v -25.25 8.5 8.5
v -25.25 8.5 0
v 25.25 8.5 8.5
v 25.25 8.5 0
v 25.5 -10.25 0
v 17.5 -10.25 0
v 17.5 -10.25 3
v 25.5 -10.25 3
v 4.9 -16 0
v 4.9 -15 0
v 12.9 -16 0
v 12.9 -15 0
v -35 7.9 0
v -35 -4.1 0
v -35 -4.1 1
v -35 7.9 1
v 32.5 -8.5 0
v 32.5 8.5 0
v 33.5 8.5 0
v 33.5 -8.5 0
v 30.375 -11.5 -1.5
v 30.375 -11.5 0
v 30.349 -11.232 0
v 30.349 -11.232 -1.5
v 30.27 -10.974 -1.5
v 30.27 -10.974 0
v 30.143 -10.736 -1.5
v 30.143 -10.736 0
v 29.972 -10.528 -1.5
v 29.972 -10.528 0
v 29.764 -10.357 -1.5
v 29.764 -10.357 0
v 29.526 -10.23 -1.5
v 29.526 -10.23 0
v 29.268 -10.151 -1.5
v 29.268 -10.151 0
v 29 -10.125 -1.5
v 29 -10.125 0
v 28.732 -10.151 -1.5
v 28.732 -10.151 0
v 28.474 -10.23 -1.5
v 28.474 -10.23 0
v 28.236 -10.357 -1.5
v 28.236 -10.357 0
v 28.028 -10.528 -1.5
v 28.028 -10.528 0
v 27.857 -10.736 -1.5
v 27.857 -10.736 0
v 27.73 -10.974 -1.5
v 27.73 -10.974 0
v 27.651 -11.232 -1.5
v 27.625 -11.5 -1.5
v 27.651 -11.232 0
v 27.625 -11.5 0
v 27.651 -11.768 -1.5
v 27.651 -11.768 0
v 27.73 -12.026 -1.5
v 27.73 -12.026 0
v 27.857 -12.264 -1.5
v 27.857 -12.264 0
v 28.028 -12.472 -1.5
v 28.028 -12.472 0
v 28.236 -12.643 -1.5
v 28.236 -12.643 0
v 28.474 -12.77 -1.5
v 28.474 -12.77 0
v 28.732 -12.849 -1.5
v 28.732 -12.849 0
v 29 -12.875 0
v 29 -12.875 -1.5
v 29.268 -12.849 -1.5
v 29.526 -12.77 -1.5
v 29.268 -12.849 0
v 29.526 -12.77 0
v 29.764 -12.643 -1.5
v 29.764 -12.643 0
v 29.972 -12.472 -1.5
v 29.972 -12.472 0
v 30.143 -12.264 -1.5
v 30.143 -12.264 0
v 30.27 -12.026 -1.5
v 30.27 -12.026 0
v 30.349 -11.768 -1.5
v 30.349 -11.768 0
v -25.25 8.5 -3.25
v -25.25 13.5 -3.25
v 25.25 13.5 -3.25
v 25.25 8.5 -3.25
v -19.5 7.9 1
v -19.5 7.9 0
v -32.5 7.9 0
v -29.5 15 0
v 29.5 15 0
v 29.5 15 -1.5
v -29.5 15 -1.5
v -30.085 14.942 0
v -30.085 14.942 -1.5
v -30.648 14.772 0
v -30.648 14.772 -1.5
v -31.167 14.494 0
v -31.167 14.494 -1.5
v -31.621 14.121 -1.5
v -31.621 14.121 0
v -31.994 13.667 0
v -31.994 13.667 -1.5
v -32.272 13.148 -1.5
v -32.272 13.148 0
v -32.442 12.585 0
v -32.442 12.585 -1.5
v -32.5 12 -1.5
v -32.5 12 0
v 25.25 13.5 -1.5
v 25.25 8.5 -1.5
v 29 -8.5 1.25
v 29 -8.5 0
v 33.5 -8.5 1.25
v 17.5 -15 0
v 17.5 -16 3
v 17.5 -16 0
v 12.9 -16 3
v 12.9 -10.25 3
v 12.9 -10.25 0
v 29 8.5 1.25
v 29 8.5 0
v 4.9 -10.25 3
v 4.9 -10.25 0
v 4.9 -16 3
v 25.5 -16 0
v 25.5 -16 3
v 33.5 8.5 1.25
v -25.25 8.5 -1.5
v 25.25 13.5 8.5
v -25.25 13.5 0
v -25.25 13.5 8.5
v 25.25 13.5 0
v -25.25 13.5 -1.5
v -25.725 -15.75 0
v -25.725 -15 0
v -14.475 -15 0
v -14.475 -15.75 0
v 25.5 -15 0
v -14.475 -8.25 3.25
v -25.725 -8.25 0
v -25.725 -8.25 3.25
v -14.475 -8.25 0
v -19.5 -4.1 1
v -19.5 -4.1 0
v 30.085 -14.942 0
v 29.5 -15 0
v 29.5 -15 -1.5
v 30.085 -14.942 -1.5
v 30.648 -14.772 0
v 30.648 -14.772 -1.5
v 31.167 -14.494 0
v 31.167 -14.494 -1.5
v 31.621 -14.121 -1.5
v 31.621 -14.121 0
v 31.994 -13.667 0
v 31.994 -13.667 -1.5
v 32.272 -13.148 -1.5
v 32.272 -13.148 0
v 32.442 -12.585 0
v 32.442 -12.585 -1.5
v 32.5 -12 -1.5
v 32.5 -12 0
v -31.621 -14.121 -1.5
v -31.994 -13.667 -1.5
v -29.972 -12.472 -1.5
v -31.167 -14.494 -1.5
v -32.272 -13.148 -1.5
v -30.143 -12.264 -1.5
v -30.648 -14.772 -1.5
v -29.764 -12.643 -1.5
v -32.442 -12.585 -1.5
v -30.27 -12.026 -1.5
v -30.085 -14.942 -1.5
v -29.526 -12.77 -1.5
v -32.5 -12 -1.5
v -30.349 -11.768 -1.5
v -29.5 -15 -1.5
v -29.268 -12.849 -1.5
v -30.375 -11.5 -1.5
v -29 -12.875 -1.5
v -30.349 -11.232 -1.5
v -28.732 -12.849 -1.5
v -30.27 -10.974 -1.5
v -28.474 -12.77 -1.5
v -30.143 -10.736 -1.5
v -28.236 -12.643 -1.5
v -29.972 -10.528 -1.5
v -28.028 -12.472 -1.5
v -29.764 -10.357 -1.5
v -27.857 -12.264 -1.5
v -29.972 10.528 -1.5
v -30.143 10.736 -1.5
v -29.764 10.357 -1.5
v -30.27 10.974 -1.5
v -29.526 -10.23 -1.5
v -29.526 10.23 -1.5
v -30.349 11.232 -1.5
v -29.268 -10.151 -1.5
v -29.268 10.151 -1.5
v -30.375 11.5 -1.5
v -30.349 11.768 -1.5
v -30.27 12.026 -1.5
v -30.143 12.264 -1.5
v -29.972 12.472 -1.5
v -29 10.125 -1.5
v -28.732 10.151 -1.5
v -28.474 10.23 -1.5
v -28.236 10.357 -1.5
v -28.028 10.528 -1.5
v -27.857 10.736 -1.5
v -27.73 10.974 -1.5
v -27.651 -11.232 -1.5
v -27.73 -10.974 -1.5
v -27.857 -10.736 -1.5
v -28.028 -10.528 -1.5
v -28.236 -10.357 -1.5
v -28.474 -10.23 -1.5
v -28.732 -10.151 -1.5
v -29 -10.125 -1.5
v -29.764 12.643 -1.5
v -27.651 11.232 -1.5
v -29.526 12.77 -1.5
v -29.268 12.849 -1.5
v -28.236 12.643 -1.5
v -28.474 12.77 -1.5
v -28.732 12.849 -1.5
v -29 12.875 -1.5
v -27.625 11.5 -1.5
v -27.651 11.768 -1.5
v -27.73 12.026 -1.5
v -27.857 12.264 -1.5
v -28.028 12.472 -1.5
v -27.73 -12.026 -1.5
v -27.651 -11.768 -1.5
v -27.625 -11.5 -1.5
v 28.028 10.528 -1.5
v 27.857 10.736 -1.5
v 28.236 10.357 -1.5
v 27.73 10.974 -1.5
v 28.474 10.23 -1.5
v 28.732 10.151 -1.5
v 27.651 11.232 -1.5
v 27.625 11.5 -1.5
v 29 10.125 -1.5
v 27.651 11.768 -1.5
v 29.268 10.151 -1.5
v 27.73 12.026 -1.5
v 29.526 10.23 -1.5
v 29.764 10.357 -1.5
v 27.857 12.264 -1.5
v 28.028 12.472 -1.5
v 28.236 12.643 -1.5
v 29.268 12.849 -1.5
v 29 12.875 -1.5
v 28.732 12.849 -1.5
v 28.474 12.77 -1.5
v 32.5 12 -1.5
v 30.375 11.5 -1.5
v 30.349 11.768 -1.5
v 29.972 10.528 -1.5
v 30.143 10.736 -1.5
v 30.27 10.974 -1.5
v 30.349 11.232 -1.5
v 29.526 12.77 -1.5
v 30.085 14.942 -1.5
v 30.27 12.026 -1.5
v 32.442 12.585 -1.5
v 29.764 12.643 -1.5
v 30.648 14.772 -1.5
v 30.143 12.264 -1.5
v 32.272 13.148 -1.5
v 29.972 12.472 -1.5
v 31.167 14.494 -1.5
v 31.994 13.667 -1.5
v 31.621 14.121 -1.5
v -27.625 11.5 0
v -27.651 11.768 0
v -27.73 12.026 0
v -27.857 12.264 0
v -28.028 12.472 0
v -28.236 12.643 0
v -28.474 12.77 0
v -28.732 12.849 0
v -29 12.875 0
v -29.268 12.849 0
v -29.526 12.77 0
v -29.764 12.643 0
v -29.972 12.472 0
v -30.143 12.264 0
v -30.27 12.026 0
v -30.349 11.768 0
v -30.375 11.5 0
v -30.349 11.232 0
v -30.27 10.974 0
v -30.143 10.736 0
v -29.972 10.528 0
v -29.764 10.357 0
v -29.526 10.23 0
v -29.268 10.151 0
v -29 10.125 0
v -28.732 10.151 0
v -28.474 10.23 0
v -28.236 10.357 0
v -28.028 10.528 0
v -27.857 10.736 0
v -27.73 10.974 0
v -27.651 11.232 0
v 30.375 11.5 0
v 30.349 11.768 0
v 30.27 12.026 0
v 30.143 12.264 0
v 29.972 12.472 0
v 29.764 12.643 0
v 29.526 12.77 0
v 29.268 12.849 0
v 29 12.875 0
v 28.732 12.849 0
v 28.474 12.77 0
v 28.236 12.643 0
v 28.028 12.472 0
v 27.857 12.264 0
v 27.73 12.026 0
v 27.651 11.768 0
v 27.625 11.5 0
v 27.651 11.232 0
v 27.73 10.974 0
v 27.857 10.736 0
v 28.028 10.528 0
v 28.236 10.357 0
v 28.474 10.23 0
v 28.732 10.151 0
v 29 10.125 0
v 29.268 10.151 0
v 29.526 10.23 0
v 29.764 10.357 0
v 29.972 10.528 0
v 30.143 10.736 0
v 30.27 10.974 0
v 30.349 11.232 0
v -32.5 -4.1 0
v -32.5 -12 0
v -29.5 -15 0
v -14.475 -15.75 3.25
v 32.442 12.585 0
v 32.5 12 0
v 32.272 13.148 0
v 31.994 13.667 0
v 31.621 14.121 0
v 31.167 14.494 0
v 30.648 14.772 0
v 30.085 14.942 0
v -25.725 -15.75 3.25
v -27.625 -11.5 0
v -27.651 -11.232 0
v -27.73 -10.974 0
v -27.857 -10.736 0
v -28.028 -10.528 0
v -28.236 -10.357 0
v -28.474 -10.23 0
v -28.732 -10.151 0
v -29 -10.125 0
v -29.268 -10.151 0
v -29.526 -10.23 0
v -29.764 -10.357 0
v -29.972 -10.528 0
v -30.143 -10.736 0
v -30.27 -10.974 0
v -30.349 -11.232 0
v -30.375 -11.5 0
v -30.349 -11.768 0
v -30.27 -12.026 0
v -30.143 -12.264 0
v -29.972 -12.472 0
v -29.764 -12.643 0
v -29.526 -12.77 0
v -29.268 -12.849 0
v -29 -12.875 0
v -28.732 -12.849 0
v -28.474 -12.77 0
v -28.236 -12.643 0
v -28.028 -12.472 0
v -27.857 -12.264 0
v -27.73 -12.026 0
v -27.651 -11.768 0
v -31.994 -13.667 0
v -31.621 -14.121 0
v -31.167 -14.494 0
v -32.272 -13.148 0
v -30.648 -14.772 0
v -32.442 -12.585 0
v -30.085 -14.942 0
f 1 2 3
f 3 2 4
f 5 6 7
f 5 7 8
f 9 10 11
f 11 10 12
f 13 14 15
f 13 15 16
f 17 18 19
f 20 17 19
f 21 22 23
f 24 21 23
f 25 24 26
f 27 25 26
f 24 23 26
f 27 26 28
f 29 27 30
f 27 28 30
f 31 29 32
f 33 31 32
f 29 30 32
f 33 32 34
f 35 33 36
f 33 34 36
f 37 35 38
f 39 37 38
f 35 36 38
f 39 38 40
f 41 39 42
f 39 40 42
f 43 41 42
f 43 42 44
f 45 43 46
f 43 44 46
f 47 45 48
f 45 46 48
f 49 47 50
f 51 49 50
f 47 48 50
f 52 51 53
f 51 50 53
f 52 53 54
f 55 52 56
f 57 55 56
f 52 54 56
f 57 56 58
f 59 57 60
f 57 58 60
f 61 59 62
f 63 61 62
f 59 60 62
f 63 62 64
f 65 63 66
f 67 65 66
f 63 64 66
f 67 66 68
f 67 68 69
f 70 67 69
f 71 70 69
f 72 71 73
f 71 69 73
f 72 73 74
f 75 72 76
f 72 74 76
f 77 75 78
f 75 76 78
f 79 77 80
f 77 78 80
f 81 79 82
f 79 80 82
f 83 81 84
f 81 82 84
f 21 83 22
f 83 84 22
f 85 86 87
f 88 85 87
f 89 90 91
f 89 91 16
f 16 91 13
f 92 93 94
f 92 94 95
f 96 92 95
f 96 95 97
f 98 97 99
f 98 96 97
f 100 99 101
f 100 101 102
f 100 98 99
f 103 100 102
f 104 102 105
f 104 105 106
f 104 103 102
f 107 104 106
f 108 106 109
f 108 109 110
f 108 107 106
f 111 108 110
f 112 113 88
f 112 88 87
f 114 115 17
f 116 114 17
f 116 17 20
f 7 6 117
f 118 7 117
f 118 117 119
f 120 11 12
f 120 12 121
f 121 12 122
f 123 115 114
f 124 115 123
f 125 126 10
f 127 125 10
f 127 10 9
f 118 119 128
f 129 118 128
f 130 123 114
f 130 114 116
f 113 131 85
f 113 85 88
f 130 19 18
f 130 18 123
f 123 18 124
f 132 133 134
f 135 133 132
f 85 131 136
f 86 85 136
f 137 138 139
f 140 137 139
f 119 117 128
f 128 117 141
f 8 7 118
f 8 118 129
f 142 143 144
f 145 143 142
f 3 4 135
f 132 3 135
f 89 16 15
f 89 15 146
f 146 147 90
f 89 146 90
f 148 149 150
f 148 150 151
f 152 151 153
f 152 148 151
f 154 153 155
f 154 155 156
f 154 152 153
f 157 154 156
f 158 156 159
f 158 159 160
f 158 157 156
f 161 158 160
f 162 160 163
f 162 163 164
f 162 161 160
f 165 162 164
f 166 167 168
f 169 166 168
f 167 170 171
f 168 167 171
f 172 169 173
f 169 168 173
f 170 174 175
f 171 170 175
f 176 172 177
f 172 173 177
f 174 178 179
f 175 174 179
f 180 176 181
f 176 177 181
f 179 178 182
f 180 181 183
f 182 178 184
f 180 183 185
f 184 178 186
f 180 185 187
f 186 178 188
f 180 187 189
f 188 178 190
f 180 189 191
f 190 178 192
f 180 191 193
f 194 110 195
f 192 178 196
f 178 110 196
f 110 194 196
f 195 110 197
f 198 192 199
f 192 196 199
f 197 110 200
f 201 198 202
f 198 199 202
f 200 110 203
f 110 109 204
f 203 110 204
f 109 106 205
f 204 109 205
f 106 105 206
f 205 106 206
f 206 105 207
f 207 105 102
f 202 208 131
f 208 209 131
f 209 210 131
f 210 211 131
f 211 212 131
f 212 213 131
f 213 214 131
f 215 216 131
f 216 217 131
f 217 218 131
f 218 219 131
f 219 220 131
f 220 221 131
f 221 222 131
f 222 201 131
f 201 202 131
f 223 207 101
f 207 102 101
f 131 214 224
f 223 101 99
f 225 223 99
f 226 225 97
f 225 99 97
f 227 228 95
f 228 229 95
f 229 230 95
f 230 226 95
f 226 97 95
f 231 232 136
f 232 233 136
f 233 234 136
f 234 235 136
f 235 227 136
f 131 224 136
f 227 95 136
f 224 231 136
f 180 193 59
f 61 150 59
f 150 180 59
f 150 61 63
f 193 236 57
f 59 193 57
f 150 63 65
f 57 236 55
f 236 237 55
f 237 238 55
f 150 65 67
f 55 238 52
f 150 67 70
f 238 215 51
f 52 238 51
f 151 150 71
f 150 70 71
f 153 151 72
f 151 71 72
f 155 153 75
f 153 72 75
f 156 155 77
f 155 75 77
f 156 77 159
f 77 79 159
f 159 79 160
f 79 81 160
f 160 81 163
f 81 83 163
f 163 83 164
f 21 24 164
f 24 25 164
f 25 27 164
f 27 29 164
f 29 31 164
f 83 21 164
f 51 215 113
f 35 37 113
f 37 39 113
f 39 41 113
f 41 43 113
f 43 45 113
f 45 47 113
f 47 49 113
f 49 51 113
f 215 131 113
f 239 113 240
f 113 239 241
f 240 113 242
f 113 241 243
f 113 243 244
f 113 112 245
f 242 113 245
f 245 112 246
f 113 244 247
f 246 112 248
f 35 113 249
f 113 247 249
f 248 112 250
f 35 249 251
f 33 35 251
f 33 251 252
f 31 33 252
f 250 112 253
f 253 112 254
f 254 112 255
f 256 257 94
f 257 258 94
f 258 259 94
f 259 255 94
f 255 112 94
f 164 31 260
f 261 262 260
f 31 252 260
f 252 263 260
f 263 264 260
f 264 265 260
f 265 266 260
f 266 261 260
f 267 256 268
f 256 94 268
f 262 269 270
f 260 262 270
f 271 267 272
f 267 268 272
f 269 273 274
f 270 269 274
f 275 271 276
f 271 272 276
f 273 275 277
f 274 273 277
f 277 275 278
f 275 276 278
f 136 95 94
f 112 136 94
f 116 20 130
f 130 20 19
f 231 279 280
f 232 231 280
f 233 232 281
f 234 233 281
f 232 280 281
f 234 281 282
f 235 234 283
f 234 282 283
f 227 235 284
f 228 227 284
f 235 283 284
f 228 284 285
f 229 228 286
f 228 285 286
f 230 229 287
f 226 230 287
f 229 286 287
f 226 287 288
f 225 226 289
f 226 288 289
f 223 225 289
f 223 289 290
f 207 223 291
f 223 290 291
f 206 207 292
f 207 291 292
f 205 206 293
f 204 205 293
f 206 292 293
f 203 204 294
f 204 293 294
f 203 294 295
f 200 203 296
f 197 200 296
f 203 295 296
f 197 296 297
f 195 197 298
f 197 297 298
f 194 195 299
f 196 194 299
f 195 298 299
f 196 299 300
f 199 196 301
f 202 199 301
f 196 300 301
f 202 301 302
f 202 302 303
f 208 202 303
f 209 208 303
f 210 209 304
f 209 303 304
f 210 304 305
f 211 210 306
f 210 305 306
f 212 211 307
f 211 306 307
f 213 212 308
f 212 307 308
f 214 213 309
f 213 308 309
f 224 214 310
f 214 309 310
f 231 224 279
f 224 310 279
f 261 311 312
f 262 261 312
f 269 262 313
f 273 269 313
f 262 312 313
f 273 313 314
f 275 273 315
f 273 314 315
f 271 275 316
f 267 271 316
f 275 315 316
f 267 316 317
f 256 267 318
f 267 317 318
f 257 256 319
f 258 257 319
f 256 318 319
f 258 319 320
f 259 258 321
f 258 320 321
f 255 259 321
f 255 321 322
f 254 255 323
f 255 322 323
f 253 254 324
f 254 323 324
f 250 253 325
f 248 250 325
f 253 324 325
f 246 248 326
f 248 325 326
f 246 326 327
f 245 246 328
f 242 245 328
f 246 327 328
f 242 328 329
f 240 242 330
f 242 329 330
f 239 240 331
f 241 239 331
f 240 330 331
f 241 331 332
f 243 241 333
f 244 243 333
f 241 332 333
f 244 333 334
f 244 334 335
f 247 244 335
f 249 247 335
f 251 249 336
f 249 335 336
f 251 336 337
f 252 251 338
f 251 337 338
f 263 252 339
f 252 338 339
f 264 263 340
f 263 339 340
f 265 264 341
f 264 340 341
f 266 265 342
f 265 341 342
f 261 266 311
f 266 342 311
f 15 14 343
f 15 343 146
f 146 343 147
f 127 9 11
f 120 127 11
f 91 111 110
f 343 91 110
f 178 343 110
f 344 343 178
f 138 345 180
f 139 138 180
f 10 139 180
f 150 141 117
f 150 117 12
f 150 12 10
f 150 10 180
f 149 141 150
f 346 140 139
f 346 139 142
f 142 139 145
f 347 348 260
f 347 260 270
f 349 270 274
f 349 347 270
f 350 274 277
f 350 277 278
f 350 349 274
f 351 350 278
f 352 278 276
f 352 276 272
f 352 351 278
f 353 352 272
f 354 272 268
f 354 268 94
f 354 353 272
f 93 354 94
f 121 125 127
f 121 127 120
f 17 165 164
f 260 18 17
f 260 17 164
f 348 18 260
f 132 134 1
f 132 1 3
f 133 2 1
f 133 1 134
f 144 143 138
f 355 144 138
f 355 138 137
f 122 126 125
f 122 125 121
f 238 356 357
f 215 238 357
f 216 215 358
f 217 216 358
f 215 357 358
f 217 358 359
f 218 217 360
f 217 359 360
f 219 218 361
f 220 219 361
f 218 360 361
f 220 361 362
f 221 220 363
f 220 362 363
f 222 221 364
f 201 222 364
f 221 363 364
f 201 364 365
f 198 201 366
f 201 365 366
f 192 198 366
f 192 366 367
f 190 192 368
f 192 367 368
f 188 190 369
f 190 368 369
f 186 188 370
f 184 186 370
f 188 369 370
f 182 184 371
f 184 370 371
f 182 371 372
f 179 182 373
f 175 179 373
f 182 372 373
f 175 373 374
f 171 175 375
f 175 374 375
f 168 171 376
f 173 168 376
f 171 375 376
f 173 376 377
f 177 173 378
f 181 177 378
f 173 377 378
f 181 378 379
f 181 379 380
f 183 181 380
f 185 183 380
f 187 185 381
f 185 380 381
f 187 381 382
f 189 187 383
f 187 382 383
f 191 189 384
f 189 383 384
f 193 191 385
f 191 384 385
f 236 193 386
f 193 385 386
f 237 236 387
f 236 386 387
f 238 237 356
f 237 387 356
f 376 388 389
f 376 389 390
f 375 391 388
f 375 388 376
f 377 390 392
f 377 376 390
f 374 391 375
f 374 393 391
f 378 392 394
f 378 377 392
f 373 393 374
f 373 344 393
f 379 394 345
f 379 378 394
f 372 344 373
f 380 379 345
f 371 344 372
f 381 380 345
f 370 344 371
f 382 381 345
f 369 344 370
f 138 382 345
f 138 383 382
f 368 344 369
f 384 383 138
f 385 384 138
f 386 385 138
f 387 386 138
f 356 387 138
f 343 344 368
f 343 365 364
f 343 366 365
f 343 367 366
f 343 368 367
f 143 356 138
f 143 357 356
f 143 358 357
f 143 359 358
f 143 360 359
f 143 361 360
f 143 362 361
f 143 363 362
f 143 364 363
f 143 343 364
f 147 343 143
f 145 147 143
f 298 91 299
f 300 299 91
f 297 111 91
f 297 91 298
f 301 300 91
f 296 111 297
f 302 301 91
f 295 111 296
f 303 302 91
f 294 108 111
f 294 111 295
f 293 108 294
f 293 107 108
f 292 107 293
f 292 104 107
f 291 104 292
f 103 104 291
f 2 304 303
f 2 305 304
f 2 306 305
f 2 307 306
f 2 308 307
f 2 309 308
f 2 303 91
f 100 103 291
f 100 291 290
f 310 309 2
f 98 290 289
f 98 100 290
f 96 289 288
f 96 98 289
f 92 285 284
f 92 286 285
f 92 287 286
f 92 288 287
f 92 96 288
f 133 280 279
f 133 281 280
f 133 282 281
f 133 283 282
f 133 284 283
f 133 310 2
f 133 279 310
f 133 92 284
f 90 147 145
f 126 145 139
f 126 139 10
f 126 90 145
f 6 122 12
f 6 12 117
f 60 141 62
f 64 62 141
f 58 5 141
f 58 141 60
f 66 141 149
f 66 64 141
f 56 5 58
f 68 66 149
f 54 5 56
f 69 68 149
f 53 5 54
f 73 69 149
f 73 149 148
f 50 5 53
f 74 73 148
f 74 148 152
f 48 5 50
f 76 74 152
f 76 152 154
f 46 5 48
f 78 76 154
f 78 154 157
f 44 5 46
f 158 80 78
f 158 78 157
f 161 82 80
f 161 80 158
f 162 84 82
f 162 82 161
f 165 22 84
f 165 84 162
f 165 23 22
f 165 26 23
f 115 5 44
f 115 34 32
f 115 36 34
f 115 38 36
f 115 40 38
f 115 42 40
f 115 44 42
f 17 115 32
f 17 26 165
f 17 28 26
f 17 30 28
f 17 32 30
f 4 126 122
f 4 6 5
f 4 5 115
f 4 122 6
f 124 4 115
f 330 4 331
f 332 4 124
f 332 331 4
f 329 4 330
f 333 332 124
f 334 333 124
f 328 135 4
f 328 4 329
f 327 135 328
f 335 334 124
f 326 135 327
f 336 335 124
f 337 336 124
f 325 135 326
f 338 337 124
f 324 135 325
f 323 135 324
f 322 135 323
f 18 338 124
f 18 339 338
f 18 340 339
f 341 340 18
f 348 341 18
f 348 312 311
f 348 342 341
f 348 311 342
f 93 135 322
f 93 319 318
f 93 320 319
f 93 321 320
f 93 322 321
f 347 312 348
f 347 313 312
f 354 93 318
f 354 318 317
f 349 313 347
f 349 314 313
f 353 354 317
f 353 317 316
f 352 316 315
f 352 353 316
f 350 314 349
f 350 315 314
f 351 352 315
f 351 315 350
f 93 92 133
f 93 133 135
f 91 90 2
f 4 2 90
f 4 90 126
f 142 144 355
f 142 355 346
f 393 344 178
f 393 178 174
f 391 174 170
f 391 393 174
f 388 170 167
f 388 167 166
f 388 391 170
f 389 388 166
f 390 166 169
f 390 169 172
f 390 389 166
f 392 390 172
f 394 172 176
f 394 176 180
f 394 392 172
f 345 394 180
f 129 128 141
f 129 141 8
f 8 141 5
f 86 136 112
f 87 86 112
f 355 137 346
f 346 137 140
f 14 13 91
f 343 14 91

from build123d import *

# Parameters (mm, degrees)
F0_W     = 8
F0_H     = 4.75
F0_W_2   = 11.25
F0_H_2   = 6.75
F0_W_3   = 3.5
F0_H_3   = 17
F0_W_4   = 13
F0_H_4   = 12
F0_R     = 1.375
F0_W_5   = 50.5
F0_H_5   = 5
F1_DEPTH = 1.5
F2_DEPTH = 3.25
F0_W_6   = 2.5
F3_DEPTH = 1
F0_H_6   = 0.75
F4_DEPTH = 3.25
F0_H_7   = 1
F5_DEPTH = 3
F0_W_7   = 1
F6_DEPTH = 1.25
F7_DEPTH = 8.5


with BuildPart() as f1:
    # F0 (on Top) → F1 (new body)
    with BuildSketch(Plane.XY):
        with Locations((21.5, -12.625)):
            Rectangle(F0_W, F0_H)
        with Locations((8.9, -12.625)):
            Rectangle(F0_W, F0_H)
        with Locations((-20.1, -11.625)):
            Rectangle(F0_W_2, F0_H_2)
        with Locations((30.75, 0)):
            Rectangle(F0_W_3, F0_H_3)
        with Locations((-26, 1.9)):
            Rectangle(F0_W_4, F0_H_4)
        with BuildLine():
            ThreePointArc((32.5, 12), (31.62132, 14.12132), (29.5, 15))
            Line((29.5, 15), (-29.5, 15))
            ThreePointArc((-29.5, 15), (-31.62132, 14.12132), (-32.5, 12))
            Line((-32.5, 12), (-32.5, 7.9))
            Line((-32.5, 7.9), (-19.5, 7.9))
            Line((-19.5, 7.9), (-19.5, -4.1))
            Line((-19.5, -4.1), (-32.5, -4.1))
            Line((-32.5, -4.1), (-32.5, -12))
            ThreePointArc((-32.5, -12), (-31.62132, -14.12132), (-29.5, -15))
            Line((-29.5, -15), (-25.725, -15))
            Line((-25.725, -15), (-25.725, -8.25))
            Line((-25.725, -8.25), (-14.475, -8.25))
            Line((-14.475, -8.25), (-14.475, -15))
            Line((-14.475, -15), (4.9, -15))
            Line((4.9, -15), (4.9, -10.25))
            Line((4.9, -10.25), (12.9, -10.25))
            Line((12.9, -10.25), (12.9, -15))
            Line((12.9, -15), (17.5, -15))
            Line((17.5, -15), (17.5, -10.25))
            Line((17.5, -10.25), (25.5, -10.25))
            Line((25.5, -10.25), (25.5, -15))
            Line((25.5, -15), (29.5, -15))
            ThreePointArc((29.5, -15), (31.62132, -14.12132), (32.5, -12))
            Line((32.5, -12), (32.5, -8.5))
            Line((32.5, -8.5), (29, -8.5))
            Line((29, -8.5), (29, 8.5))
            Line((29, 8.5), (32.5, 8.5))
            Line((32.5, 8.5), (32.5, 12))
        make_face()
        with Locations((-29, -11.5)):
            Circle(F0_R, mode=Mode.SUBTRACT)
        with Locations((29, -11.5)):
            Circle(F0_R, mode=Mode.SUBTRACT)
        with Locations((-29, 11.5)):
            Circle(F0_R, mode=Mode.SUBTRACT)
        with Locations((0, 11)):
            Rectangle(F0_W_5, F0_H_5, mode=Mode.SUBTRACT)
        with Locations((29, 11.5)):
            Circle(F0_R, mode=Mode.SUBTRACT)
        with Locations((0, 11)):
            Rectangle(F0_W_5, F0_H_5)
    extrude(amount=-F1_DEPTH)

    # F0 (on Top) → F2 (join)
    with BuildSketch(Plane.XY):
        with Locations((0, 11)):
            Rectangle(F0_W_5, F0_H_5)
    extrude(amount=-F2_DEPTH)

    # F0 (on Top) → F3 (join)
    with BuildSketch(Plane.XY):
        with Locations((-33.75, 1.9)):
            Rectangle(F0_W_6, F0_H_4)
        with Locations((-26, 1.9)):
            Rectangle(F0_W_4, F0_H_4)
    extrude(amount=F3_DEPTH)

    # F0 (on Top) → F4 (join)
    with BuildSketch(Plane.XY):
        with Locations((-20.1, -11.625)):
            Rectangle(F0_W_2, F0_H_2)
        with Locations((-20.1, -15.375)):
            Rectangle(F0_W_2, F0_H_6)
    extrude(amount=F4_DEPTH)

    # F0 (on Top) → F5 (join)
    with BuildSketch(Plane.XY):
        with Locations((8.9, -12.625)):
            Rectangle(F0_W, F0_H)
        with Locations((21.5, -12.625)):
            Rectangle(F0_W, F0_H)
        with Locations((21.5, -15.5)):
            Rectangle(F0_W, F0_H_7)
        with Locations((8.9, -15.5)):
            Rectangle(F0_W, F0_H_7)
    extrude(amount=F5_DEPTH)

    # F0 (on Top) → F6 (join)
    with BuildSketch(Plane.XY):
        with Locations((30.75, 0)):
            Rectangle(F0_W_3, F0_H_3)
        with Locations((33, 0)):
            Rectangle(F0_W_7, F0_H_3)
    extrude(amount=F6_DEPTH)

    # F0 (on Top) → F7 (join)
    with BuildSketch(Plane.XY):
        with Locations((0, 11)):
            Rectangle(F0_W_5, F0_H_5)
    extrude(amount=F7_DEPTH)


solid = f1.part
